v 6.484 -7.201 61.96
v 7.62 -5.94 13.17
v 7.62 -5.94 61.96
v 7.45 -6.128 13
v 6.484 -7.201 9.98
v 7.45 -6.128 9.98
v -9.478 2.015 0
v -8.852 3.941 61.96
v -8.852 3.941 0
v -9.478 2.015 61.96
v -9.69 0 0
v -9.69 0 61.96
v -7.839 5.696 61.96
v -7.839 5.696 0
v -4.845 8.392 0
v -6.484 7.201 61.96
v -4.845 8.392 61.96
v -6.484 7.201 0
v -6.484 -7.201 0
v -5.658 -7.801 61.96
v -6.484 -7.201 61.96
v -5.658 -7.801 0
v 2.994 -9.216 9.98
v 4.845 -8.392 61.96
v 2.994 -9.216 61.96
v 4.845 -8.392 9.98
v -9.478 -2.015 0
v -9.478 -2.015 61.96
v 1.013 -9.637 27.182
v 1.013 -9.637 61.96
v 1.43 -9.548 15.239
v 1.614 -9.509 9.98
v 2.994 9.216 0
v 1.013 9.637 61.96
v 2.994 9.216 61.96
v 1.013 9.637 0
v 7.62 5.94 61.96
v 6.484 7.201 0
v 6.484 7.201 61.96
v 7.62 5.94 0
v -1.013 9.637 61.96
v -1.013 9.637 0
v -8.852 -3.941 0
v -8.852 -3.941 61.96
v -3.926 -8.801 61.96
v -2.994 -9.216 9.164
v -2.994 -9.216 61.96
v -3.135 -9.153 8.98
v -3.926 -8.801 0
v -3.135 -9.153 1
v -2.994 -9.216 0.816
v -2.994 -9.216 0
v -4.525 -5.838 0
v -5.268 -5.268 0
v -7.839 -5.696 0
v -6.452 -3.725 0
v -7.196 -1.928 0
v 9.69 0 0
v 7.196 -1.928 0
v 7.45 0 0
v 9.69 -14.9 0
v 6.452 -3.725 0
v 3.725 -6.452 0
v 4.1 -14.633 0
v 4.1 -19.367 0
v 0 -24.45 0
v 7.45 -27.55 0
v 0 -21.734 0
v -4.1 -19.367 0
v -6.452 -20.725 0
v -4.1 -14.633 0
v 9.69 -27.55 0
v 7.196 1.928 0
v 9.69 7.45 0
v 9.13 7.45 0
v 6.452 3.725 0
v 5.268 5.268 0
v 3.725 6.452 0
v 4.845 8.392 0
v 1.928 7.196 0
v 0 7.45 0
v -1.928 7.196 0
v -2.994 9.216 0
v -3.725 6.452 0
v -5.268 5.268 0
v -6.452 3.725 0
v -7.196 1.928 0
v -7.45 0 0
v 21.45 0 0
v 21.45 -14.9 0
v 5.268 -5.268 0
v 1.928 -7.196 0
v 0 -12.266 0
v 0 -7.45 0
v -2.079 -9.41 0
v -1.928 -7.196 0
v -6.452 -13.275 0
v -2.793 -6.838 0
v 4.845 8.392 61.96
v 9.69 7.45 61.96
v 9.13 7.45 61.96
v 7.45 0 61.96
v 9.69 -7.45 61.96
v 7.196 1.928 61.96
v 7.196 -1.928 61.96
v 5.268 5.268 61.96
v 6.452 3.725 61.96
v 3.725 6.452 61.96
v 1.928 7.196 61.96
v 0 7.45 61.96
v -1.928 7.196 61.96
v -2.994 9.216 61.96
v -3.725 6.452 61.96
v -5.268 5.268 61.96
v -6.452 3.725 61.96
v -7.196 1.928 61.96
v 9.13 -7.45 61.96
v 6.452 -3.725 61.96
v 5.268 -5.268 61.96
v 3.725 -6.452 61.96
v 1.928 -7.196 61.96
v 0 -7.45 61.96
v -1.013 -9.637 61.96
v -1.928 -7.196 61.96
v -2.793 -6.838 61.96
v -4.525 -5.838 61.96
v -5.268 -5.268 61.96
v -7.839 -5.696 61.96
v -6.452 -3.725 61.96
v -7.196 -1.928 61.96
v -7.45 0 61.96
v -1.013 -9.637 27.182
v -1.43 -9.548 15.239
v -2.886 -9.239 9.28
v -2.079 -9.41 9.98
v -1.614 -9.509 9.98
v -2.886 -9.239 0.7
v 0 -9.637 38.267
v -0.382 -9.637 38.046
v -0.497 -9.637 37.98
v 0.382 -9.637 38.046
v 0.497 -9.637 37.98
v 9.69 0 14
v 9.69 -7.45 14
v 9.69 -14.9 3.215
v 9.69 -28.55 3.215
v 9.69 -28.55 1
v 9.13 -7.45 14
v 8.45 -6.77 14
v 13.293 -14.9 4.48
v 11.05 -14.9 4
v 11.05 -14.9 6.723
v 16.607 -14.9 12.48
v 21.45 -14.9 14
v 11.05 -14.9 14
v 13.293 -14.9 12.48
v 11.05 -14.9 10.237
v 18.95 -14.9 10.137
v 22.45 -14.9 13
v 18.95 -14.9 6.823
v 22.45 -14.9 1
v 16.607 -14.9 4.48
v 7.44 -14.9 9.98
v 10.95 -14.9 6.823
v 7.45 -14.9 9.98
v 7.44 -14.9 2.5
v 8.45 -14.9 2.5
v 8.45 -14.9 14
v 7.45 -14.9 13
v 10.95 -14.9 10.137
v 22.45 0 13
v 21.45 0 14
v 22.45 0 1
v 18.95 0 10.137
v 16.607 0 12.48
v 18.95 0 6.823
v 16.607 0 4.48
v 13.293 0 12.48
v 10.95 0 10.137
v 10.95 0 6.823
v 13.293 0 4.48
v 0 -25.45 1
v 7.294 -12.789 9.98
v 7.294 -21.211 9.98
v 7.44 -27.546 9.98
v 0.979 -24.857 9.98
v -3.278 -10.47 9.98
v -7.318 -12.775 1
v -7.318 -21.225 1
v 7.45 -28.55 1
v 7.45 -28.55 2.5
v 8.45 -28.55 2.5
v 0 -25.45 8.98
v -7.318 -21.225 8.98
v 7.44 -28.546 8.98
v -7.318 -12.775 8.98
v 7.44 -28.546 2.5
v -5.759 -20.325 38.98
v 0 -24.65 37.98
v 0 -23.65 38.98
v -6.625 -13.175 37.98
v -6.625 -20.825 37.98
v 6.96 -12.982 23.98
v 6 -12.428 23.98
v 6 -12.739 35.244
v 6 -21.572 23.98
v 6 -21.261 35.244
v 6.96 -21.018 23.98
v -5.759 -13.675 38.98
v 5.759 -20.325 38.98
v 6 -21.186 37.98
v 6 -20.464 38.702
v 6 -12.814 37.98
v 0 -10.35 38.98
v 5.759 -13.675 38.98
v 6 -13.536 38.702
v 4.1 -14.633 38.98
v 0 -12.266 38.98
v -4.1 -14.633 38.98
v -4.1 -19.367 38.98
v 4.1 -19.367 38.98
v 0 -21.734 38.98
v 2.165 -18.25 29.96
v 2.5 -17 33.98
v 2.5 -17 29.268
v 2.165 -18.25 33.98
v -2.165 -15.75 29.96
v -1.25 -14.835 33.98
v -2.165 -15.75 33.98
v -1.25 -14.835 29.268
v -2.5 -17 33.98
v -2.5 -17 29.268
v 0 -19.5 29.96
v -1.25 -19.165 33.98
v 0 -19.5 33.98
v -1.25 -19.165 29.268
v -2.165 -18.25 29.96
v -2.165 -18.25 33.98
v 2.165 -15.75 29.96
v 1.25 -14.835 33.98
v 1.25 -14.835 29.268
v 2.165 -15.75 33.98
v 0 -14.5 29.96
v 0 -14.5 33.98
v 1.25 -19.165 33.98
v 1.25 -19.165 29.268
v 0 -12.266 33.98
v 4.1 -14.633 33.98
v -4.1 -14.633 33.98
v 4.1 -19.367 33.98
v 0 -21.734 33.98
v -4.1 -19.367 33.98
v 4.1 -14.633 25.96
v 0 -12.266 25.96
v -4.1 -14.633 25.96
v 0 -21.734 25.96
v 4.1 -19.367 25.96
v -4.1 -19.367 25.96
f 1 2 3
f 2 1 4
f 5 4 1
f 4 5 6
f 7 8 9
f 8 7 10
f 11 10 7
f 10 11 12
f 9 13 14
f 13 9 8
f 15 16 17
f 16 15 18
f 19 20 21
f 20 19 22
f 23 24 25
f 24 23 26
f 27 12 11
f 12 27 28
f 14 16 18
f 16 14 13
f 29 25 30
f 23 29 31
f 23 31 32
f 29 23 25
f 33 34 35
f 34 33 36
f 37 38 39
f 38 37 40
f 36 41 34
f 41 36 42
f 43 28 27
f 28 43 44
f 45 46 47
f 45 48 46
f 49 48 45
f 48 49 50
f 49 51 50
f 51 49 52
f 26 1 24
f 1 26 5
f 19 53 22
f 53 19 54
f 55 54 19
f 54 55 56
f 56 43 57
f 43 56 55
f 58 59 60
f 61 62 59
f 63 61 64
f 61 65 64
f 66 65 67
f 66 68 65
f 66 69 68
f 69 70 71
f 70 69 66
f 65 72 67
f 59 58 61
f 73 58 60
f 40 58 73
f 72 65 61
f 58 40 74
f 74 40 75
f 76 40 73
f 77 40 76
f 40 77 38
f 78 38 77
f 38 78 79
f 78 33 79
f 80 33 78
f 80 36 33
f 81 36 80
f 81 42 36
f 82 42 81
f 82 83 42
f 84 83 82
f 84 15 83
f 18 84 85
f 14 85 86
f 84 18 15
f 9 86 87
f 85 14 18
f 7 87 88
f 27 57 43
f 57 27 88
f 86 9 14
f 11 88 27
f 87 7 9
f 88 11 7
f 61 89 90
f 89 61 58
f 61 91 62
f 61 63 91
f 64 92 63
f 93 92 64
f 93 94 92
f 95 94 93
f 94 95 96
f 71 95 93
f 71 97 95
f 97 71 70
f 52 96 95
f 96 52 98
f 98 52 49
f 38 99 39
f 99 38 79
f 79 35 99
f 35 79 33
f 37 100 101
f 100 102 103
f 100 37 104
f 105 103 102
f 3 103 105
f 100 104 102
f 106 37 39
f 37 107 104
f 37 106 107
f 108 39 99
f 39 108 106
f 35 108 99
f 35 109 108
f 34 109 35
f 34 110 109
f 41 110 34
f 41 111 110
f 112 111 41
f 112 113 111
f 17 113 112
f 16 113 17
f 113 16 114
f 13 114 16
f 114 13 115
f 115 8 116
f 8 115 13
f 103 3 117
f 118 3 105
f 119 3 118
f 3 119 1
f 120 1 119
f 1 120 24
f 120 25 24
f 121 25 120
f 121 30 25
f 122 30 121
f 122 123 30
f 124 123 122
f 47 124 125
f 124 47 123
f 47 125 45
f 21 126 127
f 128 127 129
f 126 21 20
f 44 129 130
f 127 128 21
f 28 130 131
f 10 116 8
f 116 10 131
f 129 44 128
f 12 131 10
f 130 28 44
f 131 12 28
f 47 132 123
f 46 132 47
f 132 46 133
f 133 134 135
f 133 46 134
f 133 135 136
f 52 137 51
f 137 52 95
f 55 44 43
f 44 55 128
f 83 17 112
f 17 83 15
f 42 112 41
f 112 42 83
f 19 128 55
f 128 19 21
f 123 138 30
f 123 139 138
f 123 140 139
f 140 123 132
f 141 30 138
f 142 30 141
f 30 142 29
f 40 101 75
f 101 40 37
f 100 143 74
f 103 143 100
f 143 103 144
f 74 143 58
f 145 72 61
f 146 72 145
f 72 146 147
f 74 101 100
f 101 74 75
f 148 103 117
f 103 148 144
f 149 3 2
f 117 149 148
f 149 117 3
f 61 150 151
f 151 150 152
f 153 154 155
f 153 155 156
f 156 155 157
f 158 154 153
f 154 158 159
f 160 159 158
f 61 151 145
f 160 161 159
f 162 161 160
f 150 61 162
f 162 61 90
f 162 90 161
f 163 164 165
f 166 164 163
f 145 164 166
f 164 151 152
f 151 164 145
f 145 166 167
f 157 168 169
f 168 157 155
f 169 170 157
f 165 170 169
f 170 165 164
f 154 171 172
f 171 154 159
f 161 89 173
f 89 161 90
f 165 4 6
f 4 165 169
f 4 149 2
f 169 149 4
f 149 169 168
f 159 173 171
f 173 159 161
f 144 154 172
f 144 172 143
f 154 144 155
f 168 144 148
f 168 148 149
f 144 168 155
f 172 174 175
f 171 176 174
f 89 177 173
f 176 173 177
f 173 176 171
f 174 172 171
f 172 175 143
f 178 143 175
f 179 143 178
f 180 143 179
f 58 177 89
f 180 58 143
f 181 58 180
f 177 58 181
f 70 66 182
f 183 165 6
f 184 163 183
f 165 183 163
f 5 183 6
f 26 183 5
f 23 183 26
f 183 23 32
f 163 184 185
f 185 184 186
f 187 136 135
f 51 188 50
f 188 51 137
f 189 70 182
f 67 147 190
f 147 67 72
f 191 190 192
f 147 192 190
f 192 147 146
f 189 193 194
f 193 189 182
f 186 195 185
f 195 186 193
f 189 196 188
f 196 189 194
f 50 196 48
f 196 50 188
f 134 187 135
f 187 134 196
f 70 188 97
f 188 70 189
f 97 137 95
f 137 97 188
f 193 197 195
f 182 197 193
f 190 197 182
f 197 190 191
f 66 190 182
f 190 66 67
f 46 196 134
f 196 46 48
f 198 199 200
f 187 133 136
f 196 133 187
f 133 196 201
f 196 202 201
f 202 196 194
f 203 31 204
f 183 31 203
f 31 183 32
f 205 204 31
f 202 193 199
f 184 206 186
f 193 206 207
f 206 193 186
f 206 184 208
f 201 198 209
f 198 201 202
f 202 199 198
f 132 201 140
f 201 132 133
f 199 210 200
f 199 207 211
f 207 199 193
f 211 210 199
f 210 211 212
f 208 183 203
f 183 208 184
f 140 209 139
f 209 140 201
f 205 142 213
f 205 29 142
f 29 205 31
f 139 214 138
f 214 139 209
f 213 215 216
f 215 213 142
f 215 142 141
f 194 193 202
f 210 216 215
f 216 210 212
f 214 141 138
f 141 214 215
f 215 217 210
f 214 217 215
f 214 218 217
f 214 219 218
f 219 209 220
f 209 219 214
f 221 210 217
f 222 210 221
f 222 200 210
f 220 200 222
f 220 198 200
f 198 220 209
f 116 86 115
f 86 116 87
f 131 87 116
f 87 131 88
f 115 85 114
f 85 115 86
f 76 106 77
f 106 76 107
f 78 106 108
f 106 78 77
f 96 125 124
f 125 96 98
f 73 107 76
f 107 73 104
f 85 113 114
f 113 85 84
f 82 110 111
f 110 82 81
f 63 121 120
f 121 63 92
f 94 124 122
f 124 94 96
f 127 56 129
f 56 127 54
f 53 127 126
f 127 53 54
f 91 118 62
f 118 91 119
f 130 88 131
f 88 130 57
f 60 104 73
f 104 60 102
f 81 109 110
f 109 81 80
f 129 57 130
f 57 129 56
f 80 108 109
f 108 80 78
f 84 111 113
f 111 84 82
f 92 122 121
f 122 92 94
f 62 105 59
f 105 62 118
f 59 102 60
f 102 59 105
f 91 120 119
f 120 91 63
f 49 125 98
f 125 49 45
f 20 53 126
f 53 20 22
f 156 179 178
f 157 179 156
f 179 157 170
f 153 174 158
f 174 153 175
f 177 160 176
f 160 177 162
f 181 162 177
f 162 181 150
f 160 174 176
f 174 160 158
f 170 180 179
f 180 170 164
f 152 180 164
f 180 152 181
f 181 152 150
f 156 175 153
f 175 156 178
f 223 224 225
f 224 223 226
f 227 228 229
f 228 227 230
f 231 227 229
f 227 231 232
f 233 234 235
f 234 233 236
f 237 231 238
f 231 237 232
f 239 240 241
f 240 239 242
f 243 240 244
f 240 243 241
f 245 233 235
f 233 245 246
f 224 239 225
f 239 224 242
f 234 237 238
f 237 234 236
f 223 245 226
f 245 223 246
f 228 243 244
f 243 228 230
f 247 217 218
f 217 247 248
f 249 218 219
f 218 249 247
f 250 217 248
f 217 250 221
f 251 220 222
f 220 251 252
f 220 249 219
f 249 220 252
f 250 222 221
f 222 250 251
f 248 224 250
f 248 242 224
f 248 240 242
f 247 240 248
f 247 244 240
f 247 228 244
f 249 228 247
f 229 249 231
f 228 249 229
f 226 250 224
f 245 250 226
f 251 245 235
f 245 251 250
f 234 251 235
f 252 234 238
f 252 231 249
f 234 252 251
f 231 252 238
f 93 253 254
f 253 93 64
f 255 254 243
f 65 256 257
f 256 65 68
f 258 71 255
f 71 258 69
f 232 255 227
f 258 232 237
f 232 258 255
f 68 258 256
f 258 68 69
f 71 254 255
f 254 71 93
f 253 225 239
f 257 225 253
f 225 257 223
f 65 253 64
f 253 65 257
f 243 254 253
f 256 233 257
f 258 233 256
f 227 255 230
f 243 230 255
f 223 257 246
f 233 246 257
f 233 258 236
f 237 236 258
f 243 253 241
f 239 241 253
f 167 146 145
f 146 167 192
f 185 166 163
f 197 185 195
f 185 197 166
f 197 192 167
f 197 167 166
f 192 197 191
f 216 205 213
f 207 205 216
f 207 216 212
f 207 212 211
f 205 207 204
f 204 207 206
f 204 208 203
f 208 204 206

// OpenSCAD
//////////////////////////////////////////////////////////////////////////////////////
///
///  I3XENDS - Split X-Ends for Prusa i3, with Endstop and Belt Tensioner
///
///  This file contains a redesign of the X-ends for the Prusa i3, including
///  motor end, idler end with belt tensioner and endstop.
///
///  The design goal is to make the X-ends stronger by splitting them into two
///  interlocking parts, printing the Z-axis related part vertically and the
///  X-axis relating part rotated 90 degrees to the back.  This way, each part
///  is printed in its optimal position, resulting in improved object strength
///  and reduced printing difficulties, such as warping and cracking. The two
///  part are joined by means of a trapezoidal slide and are locked firmly
///  together once the upped X-rod is inserted.
///
///  The idler bearing is mounted on a configurable fork which also acts as a
///  belt tensioner, being attached to the left X-end by means of an ajuster bolt.
///  Idler forks for the following bearing are predefined:
///     2x623ZZ, 2x604ZZ, 2x624Z, 2x625ZZ, 1x608ZZ
///
///  The motor X-end contains has the option for integrating a Z-endstop adjustment
///  screw.
///
///  Finally, the X-endstop holder is implemented a separate object which slides
///  on boths X-rods and is maintained firmly in its position bt means of two locking
///  screws.
///
///  The rod channels and screw holes are defined to be tight.  Use a drill with
///  the corresponding diameter to obtain perfectly fitting cavities.
///
//////////////////////////////////////////////////////////////////////////////////////
///
///  2014-10-24 Heinz Spiess, Switzerland
///
///  released under Creative Commons - Attribution - Share Alike licence (CC BY-SA)
//////////////////////////////////////////////////////////////////////////////////////

// extrusion specific parameters
ew = 0.56;    // extrusion width
eh = 0.25;    // layer height
epsgap = 0.1; // gap between complementing parts
wall = [6*ew, 8*ew, 14*eh, 4*ew]; // wall thickness x/y/z/lm8uu


// build a cube with chamfered edges
module chamfered_cube(size,d=[1,1,1]){
   hull(){
     translate([d[0],d[1],0])cube(size-2*[d[0],d[1],0]);
     translate([0,d[1],d[2]])cube(size-2*[0,d[1],d[2]]);
     translate([d[0],0,d[2]])cube(size-2*[d[0],0,d[2]]);
   }
}


// build a cylinder with chamfered edges
module chamfered_cylinder(r=0,r1=0,r2=0,h=0,d=1){
   hull(){
      translate([0,0,d])cylinder(r1=(r?r:r1),r2=(r>0?r:r2),h=h-2*d);
      cylinder(r1=(r?r:r1)-d,r2=(r>0?r:r2)-d,h=h);
   }
}


//////////////////////////////////////////////////////////////////////////////////////
///
///  The module i3_xend() contains all parts of the project as sub-modules. 
///  (This is convenient since this way, the parameters can easily be shared.)
///
//////////////////////////////////////////////////////////////////////////////////////
module i3_xend(motorend=true, idlerend=false, idler=false, bearing=[5,17,11], endstop=false, zcarriage=true, support=true, idlerclamps=false){
xdist = 45;   // distance between x-rods
xrod = 8;     // diameter of x-rods
lm8uu = 14.9;   // diameter of linear bearing;


motor_d = 42; // motor side length (Nema 17)
motor_s = 31; // motor mounting screws spacing

madj = 2.5;   // screw hole for adjuster screw (cut thread with M3 tap)
m3 = 3;       // motor screw diameter
m3n = 5.5;    // M3 nut diameter
m3nh = 2.5;   // M3 nut height
m5 = 5;       // threaded z-rod diameter
m5n = 8.2;    // nut size on threaded x-rod (not too tight!)
m5nh = 5;     // nut height on threaded x-rod
zsrod = 8;    // diameter of smooth z-rod
ztrod = 5;    // diameter of threaded z-rod
zdist = motor_d/2-zsrod/2; // center-to-center distance between z-rods

idl = 20;     // idler length
idg = 0.25;   // gap for idler
ids = m3;      // idler tensioning screw diameter
idn = m3n;    // idler nut diameter
idnh = m3nh;   // idler nut height

xgap = 10-wall[0]-(lm8uu-xrod)/2;    // gap between x-motor and wall

esl = 15;     // endstop length (along x-rods)
esd = 9.5;    // endstop switch screw distance

//  don't change the following, they are just to make code more readble
ml1 = motor_d+xgap;                    // upper length of motor end left of origin
ml2 = lm8uu/2+2*wall[0]+zdist+m5n;      // length of motor end right of origin
ml3 = motor_d/2-motor_s/4-m3+xgap;      // lower length of motor end left of origin
mlz = wall[0]+lm8uu/2;                  // x-position of smooth zrod
d1 = 2*wall[2]+xrod;                    // height of main body
d2 = wall[2]+xrod-1;                    // height of motor base
h1 = xdist+2*wall[1]+xrod;              // total height

itl = ml2-idl-2*wall[0];                // idler tail length
idh = d1;     // idler height
ith = d1;                               // idler tail height
idd = d1;   // idler depth
idc = d1-1;
idca = -45;


///////////////////////////////////////////////////////////////////////////////
// local module for the interlocking Z-carriage part for motor and idler end
///////////////////////////////////////////////////////////////////////////////
module zcarriage(hole=true,l=h1,eps=0){
   translate([0,0,-eps])difference(){
      union(){
         // outer cylinder for linear bearing holder
         cylinder(r=lm8uu/2+wall[3]+eps,h=l+2*eps);
	 // locking rail
         hull(){
            translate([-lm8uu/2-wall[3]-eps,-lm8uu/2-eps,0])cube([ew+2*eps,lm8uu+2*eps,l+2*eps]);
            translate([-lm8uu/2-eps,-lm8uu/2+wall[3]-eps,0])cube([ew+2*eps,lm8uu-2*wall[3]+2*eps,l+2*eps]);
         }
	 // upper x-rod lock
         translate([-lm8uu/2-d1-eps,-lm8uu-eps,0-eps])chamfered_cube([d1+2*eps,lm8uu+2*eps,d1-1+2*eps],[1,0,1]);
	 // nut holder for threaded z-rod
	 hull(){
	   //translate([0,-zdist,0])rotate(30)chamfered_cylinder(r=lm8uu/2+1,h=h1/2,$fn=6);
	   translate([0,-zdist,0])rotate(30)chamfered_cylinder(r=lm8uu/2+1,h=h1/2-motor_d/2,$fn=6);
	   translate([-lm8uu/2-wall[3],-ml2+mlz-eps+0.01,0])chamfered_cube([wall[3],ml2-mlz+2*eps,h1/2-motor_d/2],[0,1,1]);
	 }
	 //%color("grey")  
	 hull(){
	   translate([0,-zdist,0])rotate(30)chamfered_cylinder(r=lm8uu/2+0.2,h=h1/2+8,$fn=6);
	   translate([0,-zdist,0])rotate(30)chamfered_cylinder(r=lm8uu/2+1,h=h1/2-motor_d/2,$fn=6);
	 }
      }
      // lock for nut holder
	  //%color("grey")  
      hull(){
         translate([-lm8uu/2-wall[2]-0.1,-ml2+mlz,wall[2]+0.5+eps])cube([1,ml2-mlz-lm8uu,h1],[0,1,1]);
         translate([-lm8uu/2-1,-ml2+mlz-1,wall[2]-1+eps])cube([1.01,ml2-mlz-lm8uu+1,h1],[0,1,1]);
      }
	  //%color("blue")  
	  //cube([.01,ml2-mlz-lm8uu+1,h1],[0,1,1]);
      //hull(){
      //   translate([-lm8uu/2-1.1,-ml2+mlz+7.76,wall[2]+0.5+eps+10])cube([1,ml2-mlz-lm8uu,h1],[0,1,1]);
      //   translate([-lm8uu/2,-ml2+mlz+7.76,wall[2]-1+eps+10.5])cube([.01,ml2-mlz-lm8uu+1,h1],[0,1,1]);
      //}
      // cavities
      if(hole){
         // cavity for linear bearings
         translate([0,0,-1])cylinder(r=lm8uu/2,h=l+2);
	 // longitudinal cutout to allow flexing
         rotate(210)translate([-1,0,-1])cube([2,lm8uu/2+wall[3]+0.1,l+2]);
	 // x-rod hole throu x-rod lock
         translate([-lm8uu/2-d1/2,1,wall[1]+xrod/2])rotate([90,0,0])rotate(22.5)cylinder(r=xrod/2/cos(22.5),h=lm8uu+2,$fn=8);
	 // hole for threaded z-rod
	 //%color("grey")translate([0,-zdist,-1])cylinder(r=m5/2,h=h1+2,$fn=12);
		 // %color("grey") 
	 translate([0,-zdist,-1])cylinder(r=m5/2,h=h1+2,$fn=12);
	 // nut cavity for threaded z-rod
	 //%color("grey")  
	 translate([0,-zdist,h1/2+3])rotate(30)cylinder(r=m5n/2/cos(30),h=m5nh+0.1,$fn=6);
		  
		 //%color("blue")  
		 hull(){
			translate([0,-zdist,h1/2-motor_d/2-m5nh-1])rotate(30)cylinder(r=m5/2,h=h1/2-5,$fn=6);
			translate([0,-zdist,h1/2-motor_d/2-m5nh-6])rotate(30)cylinder(r=m5n/2/cos(30),h=h1/2-4,$fn=6);
		 }
      }
	  //%color("blue")  
	  translate([-8,-30,h1/2-7]) cube([2,20,15]);
   }
}


///////////////////////////////////////////////////////////////////////////////
// local module to build the base of the motor end
///////////////////////////////////////////////////////////////////////////////
module motorend(){
difference(){
union(){
difference(){
   union(){
      // main body upper part
      hull(){
         translate([-ml1,-1,0])
            chamfered_cube([ml1+ml2,h1/2+1,d2]);
         translate([-ml3,-1,0])
            chamfered_cube([ml3+ml2,h1/2+1,d1]);
      }
      // main body lower part
      translate([-ml3,-h1/2,0])
         chamfered_cube([ml3+ml2,h1/2+2,d1]);
      // z-adjuster screw base
      if(endstop)
         hull()for(xz=[[0,d1/2,6],[0,d1+lm8uu/2,36],[10,d1-5,6]])
            translate([-motor_d/2-xgap+motor_s/2+xz[0],-h1/2,xz[1]])rotate([-90,0,0])
               chamfered_cylinder(r=motor_s/2-motor_s/4-m3,h=h1/2-motor_d/2,$fn=xz[2]);

   }

   for(sy=[-1,1])scale([1,sy,1]){
      // x-rod holes
      translate([0,xdist/2,d1/2])rotate([0,90,0])rotate(22.5)cylinder(r=xrod/2/cos(22.5),h=ml2+1,$fn=8);
      // holes for motor screws
      for(fx=[-1,1])translate([-xgap-motor_d/2+fx*motor_s/2,motor_s/2,-1]){
         // main screw holes
         cylinder(r=m3/2,h=d2+1,$fn=6);
         // cavities for screw heads
	 translate([0,0,7]) cylinder(r=m3,h=d1+2,$fn=12);
      }
   }
   
   // main belt channel 
   translate([-motor_d-xgap-1,-motor_d/4,wall[2]])
      cube([motor_d+xgap+ml2+2,motor_d/2,xrod]);
   hull(){
      translate([-xgap-wall[0],-motor_d/4,wall[2]])
         cube([xgap+ml2+2,motor_d/2,xrod]);
      translate([0,-motor_s/2+2,wall[2]])
         cube([ml2+2,motor_s-4,xrod]);
   }
   // upper motor cavity
   translate([-motor_d-xgap-1,-motor_d/2,d2])
      cube([motor_d+xgap,motor_d,wall[2]+2]);
   //main cutout for motor
   translate([-motor_d-xgap-1,-motor_d/4,-1])
      cube([motor_d,motor_d/2,wall[2]+xrod+2]);
   // octogonal cutout centered on motor axis
   translate([-xgap-motor_d/2,0,0])hull()for(a=[0,90])rotate(a)
      cube([motor_d/2,motor_s-2,motor_d],true);

    // Z-adjuster screw hole
    if(endstop)
       translate([-motor_d/2-xgap+motor_s/2,-h1/2,d1+lm8uu/2])rotate([-90,0,0])
          translate([0,0,-1])cylinder(r=madj/2,h=h1/2+wall[1]-motor_d/2+2,$fn=6);
}
 
    // belt separating wall 
    translate([0,-wall[1]/2,0])chamfered_cube([ml2,wall[1],d1]);
}
   // cutout for linear bearings holder
    translate([wall[0]+lm8uu/2,h1/2,d1+lm8uu/2])rotate([90,0,0])
       rotate(90){
          zcarriage(hole=false,eps=epsgap);
          if(!support)%color("cyan")zcarriage(hole=true);
       }

}

    if(zcarriage)translate([-motor_d+xgap,0,0])rotate(90)
       zcarriage(hole=true);
}

///////////////////////////////////////////////////////////////////////////////
// local module to build the idler fork for the specified bearing parameters
//    bearing[0]   inner diameter (axis)
//    bearing[1]   outer diameter (incl. belt)
//    bearing[2]   width of bearing (incl. washers)
///////////////////////////////////////////////////////////////////////////////
module idler(){
   assign(idD = bearing[2]+2*wall[2])
   assign(idE = bearing[1]/2)
   difference(){
      union(){
         // main body
	 hull(){
            translate([0,-idd/2,0])chamfered_cube([idl,idd,idh]);
            translate([-idE-2,-idD/2,0])chamfered_cube([idl/2+idE,idD,idh]);
	    // front end
            translate([-idE+1,-idD/2,idh/2])rotate([-90,0,0])rotate(0)chamfered_cylinder(r=idh/2,h=idD);
	 }
	 // tail
         translate([0,-idd/2+wall[2]+epsgap,0])chamfered_cube([ml2-2*wall[0],idd-2*wall[2]-2*epsgap,idh]);
      }
      // hole tensioning screw
      translate([-1,0,d1/2])rotate([0,90,0])rotate(30)cylinder(r=ids/2,h=ml2+2,$fn=6);
      // axis hole
      translate([-idE+bearing[0]/2,-idD/2-1,d1/2])rotate([-90,0,0])cylinder(r=bearing[0]/2,h=idD+2);
      hull(){
         // bearing cavity 
         translate([-idE+2,-bearing[2]/2,d1/2])rotate([-90,0,0])cylinder(r=max(bearing[1],idh/cos(30)+2)/2,h=bearing[2]);
         // main cavity
         translate([-idd-1,-idd/2+wall[1],-1])chamfered_cube([idd+idl-wall[0]+1,idd-2*wall[1],idh+2]);
      }
      // tensioning nut cage
      hull()for(y=[0,xrod])translate([(idl+ml2-3*wall[1])/2,y,d1/2])rotate([0,90,0])
         rotate(30)cylinder(r=idn/2/cos(30)+(y?0.4:0),h=idnh,$fn=6);
   }
     
}

///////////////////////////////////////////////////////////////////////////////
// local module to build the idler X-end
///////////////////////////////////////////////////////////////////////////////
module idlerend(){
   difference(){
      union(){
         // main body
         translate([0,-h1/2,0]) chamfered_cube([ml2,h1,d1]);
	 // idler clamp screws
	 if(idlerclamps)for(sy=[-1,1])scale([1,sy,1]){
	     translate([ml2-idc/2,-xdist/2,d1/2])rotate([idca,0,0])chamfered_cylinder(r=idc/2,h=d1/2+m3nh+wall[2],d=2,$fn=36);
	 }
      }
   
      for(sy=[-1,1])scale([1,sy,1]){
         // x-rod holes
         translate([-1,xdist/2,d1/2])rotate([0,90,0])rotate(22.5)cylinder(r=xrod/2/cos(22.5),h=ml2+2,$fn=8);
      }
      
      // idler clamp screw
      if(idlerclamps)for(sy=[-1,1])scale([1,sy,1])
         translate([ml2-idc/2,-xdist/2,d1/2])rotate([idca,0,0]){
           // idler clamp screw head cavity (if needed)
	   cylinder(r=m3/2,h=d1/2+m3nh+wall[2]+3,$fn=6);
           // idler clamp screw holes
	   translate([0,0,d1/2+m3nh+wall[2]+0.01])cylinder(r=m3,h=d1/2+m3nh+wall[2]+3,$fn=12);
           // idler clamp screw nut traps
	   hull()for(x=[0,idc/2+.1])translate([x,0,xrod/2+wall[2]-1-epsgap/2])
	      cylinder(r=m3n/2+(x?0.35:epsgap),h=m3nh+epsgap,$fn=6);
      }
      // main belt channel 
      translate([-1,-motor_s/2+(idlerclamps?3.5:2),wall[2]-eh])
         cube([ml2+2,motor_s-(idlerclamps?7:4),xrod+eh]);
   
      // idler cut-out
      translate([ml2-idl-idg,-idh/2-idg,-0.01])chamfered_cube([idl+10,idh+2*idg,d1+0.02],[1,0,1]);
   
 
      // cutout for linear bearings holder
      translate([wall[0]+lm8uu/2,h1/2,d1+lm8uu/2])rotate([90,0,0])
         rotate(90){
            zcarriage(hole=false,eps=epsgap);
            if(!support)%color("cyan")zcarriage(hole=true);
         }
   }
   // idler support structure (cut away after printing!)
   if(support)color("red")difference(){
      union(){
         translate([ml2-idl-2,-idh/2-2,d1-wall[2]])cube([idl+2,idh+4,eh]);
         translate([ml2-idl+1,-idh/2+1,0])cube([idl-1,idh-2,d1-wall[2]]);
      }
      translate([ml2-idl+1+2,-idh/2+1+2,-1])cube([idl-1,idh-2-4,d1-wall[2]+2]);
   }else{  // draw idler
      %color("green")translate([ml2+5,idd/2,idh/2])rotate([90,0,0])rotate(180)idler();
   }

   // tail cage for idler fork
   difference(){
      translate([0,-ith/2-wall[1]+(idlerclamps?1:0),wall[2]-eh-0.01])cube([ml2-idl,ith+2*wall[1]-(idlerclamps?2:0),xrod+eh+0.02]);
      translate([2*wall[0],-ith/2-idg,wall[2]])cube([ml2-idl-2*wall[0]+1,ith+2*idg,xrod]);
      translate([-1,0,d1/2])rotate([0,90,0])cylinder(r=ids/2,h=2*wall[0]+2);
   }

    
   // build separate interlocking z-carriage part
   if(zcarriage)translate([-2*lm8uu,h1/3,0]) rotate(90)zcarriage(hole=true);
}

///////////////////////////////////////////////////////////////////////////////
// local module to build the X-endstop
///////////////////////////////////////////////////////////////////////////////
module endstop(){
   difference(){
      union(){
         // main body upper part
         translate([0,-h1/2,0]) chamfered_cube([esl,h1,d1+m3nh+wall[2]]);
      }

      for(sy=[-1,1])scale([1,sy,1]){
         // x-rod holes
         translate([-1,xdist/2,d1/2])rotate([0,90,0])
            rotate(22.5)cylinder(r=xrod/2/cos(22.5),h=esl+2,$fn=8);
         // x-rod nut cavities
         hull()for(x=[0,esl/2])translate([x,xdist/2,d1-1])
            rotate(30)cylinder(r=m3n/2/cos(30)+(x?0.2:0),h=m3nh,$fn=6);
         // x-rod clamping screw holes - lower part
         translate([esl/2,xdist/2,d1-wall[2]])cylinder(r=m3/2,h=wall[2],$fn=6);
         // x-rod clamping screw holes - upper part
         translate([esl/2,xdist/2,d1+m3nh-1+eh])cylinder(r=m3/2,h=wall[2]+2,$fn=6);
         // end switch screw slots
         for(i=[0:1])translate([esl/2-m3/2,i*esd+esd/8,d1+m3nh])
            cube([m3,0.75*esd,wall[2]+1]);
         translate([esl/2,-xdist/2+xrod/2+wall[1]+0.5,0])cylinder(r1=0,r2=m3+1,h=d1+m3nh-0.01);
      }
         
      // belt channel 
      translate([-1,-xdist/2+xrod/2+wall[1],-1])
         cube([ml2+2,xdist-xrod-2*wall[1],xrod+2*wall[2]+m3nh+1]);
      translate([esl/2-m3/2,-motor_s/2,d1+m3nh-eh])
         cube([m3,motor_s,3*eh]);
   }
   // bridging support  
   if(support)color("red")hull(){
      translate([2,-2,0])cube([esl-4,4,1]);
      translate([-1,-ew/2,d1+m3nh-1])cube([esl+2,ew,1]);
   }

}
   
//  now build the desired part(s)

if(motorend)motorend();

if(endstop && !motorend)endstop();

if(idlerend)
   scale([-1,1,1])idlerend();
if(idler)
   translate([35,20,0])rotate(180)idler();

if(zcarriage && !motorend && !idlerend && !endstop &&!idler)zcarriage();

}

//////////////////////////////////////////////////////////////////////////////
///  Modules for automatic building of specific STL file via Makefile
//////////////////////////////////////////////////////////////////////////////

module motorxend(){ // AUTO_MAKE_STL
   i3_xend(motorend=true,idlerend=false,idler=false);
}

module motorxend_zendstop(){ // AUTO_MAKE_STL
   i3_xend(motorend=true,idlerend=false,idler=false,endstop=true);
}

module idlerxend(){ // AUTO_MAKE_STL
   i3_xend(motorend=false,idlerend=true,idler=false);
}

module idlerxend_xrodclamps(){ // AUTO_MAKE_STL
   i3_xend(motorend=false,idlerend=true,idler=false,idlerclamps=true);
}

module xendstop(){ // AUTO_MAKE_STL
   i3_xend(motorend=false,idlerend=false,idler=false,endstop=true);
}

module idler2x625(){ // AUTO_MAKE_STL
   i3_xend(motorend=false,idlerend=false,idler=true,bearing=[5,17,11]);
}

module idler2x624(){ // AUTO_MAKE_STL
   i3_xend(motorend=false,idlerend=false,idler=true,bearing=[4,14,11]);
}

module idler2x623(){ // AUTO_MAKE_STL
   i3_xend(motorend=false,idlerend=false,idler=true,bearing=[3,11,9]);
}

module idler2x604(){ // AUTO_MAKE_STL
   i3_xend(motorend=false,idlerend=false,idler=true,bearing=[4,13,9]);
}

module idler608(){ // AUTO_MAKE_STL
   i3_xend(motorend=false,idlerend=false,idler=true,bearing=[8,18,8]);
}

//////////////////////////////////////////////////////////////////////////////
///  Uncomment as needed for manual printing
//////////////////////////////////////////////////////////////////////////////
scale([-1,1,1])
i3_xend(motorend=false,idlerend=false,idler=false,support=true,zcarriage=true,idlerclamps=true);
//scale([-1,1,1])i3_xend(motorend=false,idlerend=false,idler=false,support=false,zcarriage=true,idlerclamps=false);
//idlerxend();
//motorxend();
//motorxend_zendstop();
//idlerxend_xrodclamps();
//xendstop();
//idler2x625();
//idler2x623();
//idler2x604();
//idler608();
//
/// show all in print position:
//motorxend_zendstop();
//translate([55,0,0])xendstop();
//translate([120,0,0])idlerxend();
//translate([110,-45,0])rotate(180)idler2x604();
//
/// show all in working position:
//rotate(180)translate([30,90,0])
//{translate([-50,0,0])i3_xend(motorend=true,idlerend=false,idler=false,support=false,zcarriage=false);
//translate([85,0,0])i3_xend(motorend=false,idlerend=true,idler=false,support=false,zcarriage=false);
//i3_xend(motorend=false,idlerend=false,endstop=true,support=false,zcarriage=false);}
//translate([-50,0,0])i3_xend(motorend=true,idlerend=false,idler=false,support=false,zcarriage=false);
//translate([85,0,0])i3_xend(motorend=false,idlerend=true,idler=false,support=false,zcarriage=false);
//i3_xend(motorend=false,idlerend=false,endstop=true,support=false,zcarriage=false);
